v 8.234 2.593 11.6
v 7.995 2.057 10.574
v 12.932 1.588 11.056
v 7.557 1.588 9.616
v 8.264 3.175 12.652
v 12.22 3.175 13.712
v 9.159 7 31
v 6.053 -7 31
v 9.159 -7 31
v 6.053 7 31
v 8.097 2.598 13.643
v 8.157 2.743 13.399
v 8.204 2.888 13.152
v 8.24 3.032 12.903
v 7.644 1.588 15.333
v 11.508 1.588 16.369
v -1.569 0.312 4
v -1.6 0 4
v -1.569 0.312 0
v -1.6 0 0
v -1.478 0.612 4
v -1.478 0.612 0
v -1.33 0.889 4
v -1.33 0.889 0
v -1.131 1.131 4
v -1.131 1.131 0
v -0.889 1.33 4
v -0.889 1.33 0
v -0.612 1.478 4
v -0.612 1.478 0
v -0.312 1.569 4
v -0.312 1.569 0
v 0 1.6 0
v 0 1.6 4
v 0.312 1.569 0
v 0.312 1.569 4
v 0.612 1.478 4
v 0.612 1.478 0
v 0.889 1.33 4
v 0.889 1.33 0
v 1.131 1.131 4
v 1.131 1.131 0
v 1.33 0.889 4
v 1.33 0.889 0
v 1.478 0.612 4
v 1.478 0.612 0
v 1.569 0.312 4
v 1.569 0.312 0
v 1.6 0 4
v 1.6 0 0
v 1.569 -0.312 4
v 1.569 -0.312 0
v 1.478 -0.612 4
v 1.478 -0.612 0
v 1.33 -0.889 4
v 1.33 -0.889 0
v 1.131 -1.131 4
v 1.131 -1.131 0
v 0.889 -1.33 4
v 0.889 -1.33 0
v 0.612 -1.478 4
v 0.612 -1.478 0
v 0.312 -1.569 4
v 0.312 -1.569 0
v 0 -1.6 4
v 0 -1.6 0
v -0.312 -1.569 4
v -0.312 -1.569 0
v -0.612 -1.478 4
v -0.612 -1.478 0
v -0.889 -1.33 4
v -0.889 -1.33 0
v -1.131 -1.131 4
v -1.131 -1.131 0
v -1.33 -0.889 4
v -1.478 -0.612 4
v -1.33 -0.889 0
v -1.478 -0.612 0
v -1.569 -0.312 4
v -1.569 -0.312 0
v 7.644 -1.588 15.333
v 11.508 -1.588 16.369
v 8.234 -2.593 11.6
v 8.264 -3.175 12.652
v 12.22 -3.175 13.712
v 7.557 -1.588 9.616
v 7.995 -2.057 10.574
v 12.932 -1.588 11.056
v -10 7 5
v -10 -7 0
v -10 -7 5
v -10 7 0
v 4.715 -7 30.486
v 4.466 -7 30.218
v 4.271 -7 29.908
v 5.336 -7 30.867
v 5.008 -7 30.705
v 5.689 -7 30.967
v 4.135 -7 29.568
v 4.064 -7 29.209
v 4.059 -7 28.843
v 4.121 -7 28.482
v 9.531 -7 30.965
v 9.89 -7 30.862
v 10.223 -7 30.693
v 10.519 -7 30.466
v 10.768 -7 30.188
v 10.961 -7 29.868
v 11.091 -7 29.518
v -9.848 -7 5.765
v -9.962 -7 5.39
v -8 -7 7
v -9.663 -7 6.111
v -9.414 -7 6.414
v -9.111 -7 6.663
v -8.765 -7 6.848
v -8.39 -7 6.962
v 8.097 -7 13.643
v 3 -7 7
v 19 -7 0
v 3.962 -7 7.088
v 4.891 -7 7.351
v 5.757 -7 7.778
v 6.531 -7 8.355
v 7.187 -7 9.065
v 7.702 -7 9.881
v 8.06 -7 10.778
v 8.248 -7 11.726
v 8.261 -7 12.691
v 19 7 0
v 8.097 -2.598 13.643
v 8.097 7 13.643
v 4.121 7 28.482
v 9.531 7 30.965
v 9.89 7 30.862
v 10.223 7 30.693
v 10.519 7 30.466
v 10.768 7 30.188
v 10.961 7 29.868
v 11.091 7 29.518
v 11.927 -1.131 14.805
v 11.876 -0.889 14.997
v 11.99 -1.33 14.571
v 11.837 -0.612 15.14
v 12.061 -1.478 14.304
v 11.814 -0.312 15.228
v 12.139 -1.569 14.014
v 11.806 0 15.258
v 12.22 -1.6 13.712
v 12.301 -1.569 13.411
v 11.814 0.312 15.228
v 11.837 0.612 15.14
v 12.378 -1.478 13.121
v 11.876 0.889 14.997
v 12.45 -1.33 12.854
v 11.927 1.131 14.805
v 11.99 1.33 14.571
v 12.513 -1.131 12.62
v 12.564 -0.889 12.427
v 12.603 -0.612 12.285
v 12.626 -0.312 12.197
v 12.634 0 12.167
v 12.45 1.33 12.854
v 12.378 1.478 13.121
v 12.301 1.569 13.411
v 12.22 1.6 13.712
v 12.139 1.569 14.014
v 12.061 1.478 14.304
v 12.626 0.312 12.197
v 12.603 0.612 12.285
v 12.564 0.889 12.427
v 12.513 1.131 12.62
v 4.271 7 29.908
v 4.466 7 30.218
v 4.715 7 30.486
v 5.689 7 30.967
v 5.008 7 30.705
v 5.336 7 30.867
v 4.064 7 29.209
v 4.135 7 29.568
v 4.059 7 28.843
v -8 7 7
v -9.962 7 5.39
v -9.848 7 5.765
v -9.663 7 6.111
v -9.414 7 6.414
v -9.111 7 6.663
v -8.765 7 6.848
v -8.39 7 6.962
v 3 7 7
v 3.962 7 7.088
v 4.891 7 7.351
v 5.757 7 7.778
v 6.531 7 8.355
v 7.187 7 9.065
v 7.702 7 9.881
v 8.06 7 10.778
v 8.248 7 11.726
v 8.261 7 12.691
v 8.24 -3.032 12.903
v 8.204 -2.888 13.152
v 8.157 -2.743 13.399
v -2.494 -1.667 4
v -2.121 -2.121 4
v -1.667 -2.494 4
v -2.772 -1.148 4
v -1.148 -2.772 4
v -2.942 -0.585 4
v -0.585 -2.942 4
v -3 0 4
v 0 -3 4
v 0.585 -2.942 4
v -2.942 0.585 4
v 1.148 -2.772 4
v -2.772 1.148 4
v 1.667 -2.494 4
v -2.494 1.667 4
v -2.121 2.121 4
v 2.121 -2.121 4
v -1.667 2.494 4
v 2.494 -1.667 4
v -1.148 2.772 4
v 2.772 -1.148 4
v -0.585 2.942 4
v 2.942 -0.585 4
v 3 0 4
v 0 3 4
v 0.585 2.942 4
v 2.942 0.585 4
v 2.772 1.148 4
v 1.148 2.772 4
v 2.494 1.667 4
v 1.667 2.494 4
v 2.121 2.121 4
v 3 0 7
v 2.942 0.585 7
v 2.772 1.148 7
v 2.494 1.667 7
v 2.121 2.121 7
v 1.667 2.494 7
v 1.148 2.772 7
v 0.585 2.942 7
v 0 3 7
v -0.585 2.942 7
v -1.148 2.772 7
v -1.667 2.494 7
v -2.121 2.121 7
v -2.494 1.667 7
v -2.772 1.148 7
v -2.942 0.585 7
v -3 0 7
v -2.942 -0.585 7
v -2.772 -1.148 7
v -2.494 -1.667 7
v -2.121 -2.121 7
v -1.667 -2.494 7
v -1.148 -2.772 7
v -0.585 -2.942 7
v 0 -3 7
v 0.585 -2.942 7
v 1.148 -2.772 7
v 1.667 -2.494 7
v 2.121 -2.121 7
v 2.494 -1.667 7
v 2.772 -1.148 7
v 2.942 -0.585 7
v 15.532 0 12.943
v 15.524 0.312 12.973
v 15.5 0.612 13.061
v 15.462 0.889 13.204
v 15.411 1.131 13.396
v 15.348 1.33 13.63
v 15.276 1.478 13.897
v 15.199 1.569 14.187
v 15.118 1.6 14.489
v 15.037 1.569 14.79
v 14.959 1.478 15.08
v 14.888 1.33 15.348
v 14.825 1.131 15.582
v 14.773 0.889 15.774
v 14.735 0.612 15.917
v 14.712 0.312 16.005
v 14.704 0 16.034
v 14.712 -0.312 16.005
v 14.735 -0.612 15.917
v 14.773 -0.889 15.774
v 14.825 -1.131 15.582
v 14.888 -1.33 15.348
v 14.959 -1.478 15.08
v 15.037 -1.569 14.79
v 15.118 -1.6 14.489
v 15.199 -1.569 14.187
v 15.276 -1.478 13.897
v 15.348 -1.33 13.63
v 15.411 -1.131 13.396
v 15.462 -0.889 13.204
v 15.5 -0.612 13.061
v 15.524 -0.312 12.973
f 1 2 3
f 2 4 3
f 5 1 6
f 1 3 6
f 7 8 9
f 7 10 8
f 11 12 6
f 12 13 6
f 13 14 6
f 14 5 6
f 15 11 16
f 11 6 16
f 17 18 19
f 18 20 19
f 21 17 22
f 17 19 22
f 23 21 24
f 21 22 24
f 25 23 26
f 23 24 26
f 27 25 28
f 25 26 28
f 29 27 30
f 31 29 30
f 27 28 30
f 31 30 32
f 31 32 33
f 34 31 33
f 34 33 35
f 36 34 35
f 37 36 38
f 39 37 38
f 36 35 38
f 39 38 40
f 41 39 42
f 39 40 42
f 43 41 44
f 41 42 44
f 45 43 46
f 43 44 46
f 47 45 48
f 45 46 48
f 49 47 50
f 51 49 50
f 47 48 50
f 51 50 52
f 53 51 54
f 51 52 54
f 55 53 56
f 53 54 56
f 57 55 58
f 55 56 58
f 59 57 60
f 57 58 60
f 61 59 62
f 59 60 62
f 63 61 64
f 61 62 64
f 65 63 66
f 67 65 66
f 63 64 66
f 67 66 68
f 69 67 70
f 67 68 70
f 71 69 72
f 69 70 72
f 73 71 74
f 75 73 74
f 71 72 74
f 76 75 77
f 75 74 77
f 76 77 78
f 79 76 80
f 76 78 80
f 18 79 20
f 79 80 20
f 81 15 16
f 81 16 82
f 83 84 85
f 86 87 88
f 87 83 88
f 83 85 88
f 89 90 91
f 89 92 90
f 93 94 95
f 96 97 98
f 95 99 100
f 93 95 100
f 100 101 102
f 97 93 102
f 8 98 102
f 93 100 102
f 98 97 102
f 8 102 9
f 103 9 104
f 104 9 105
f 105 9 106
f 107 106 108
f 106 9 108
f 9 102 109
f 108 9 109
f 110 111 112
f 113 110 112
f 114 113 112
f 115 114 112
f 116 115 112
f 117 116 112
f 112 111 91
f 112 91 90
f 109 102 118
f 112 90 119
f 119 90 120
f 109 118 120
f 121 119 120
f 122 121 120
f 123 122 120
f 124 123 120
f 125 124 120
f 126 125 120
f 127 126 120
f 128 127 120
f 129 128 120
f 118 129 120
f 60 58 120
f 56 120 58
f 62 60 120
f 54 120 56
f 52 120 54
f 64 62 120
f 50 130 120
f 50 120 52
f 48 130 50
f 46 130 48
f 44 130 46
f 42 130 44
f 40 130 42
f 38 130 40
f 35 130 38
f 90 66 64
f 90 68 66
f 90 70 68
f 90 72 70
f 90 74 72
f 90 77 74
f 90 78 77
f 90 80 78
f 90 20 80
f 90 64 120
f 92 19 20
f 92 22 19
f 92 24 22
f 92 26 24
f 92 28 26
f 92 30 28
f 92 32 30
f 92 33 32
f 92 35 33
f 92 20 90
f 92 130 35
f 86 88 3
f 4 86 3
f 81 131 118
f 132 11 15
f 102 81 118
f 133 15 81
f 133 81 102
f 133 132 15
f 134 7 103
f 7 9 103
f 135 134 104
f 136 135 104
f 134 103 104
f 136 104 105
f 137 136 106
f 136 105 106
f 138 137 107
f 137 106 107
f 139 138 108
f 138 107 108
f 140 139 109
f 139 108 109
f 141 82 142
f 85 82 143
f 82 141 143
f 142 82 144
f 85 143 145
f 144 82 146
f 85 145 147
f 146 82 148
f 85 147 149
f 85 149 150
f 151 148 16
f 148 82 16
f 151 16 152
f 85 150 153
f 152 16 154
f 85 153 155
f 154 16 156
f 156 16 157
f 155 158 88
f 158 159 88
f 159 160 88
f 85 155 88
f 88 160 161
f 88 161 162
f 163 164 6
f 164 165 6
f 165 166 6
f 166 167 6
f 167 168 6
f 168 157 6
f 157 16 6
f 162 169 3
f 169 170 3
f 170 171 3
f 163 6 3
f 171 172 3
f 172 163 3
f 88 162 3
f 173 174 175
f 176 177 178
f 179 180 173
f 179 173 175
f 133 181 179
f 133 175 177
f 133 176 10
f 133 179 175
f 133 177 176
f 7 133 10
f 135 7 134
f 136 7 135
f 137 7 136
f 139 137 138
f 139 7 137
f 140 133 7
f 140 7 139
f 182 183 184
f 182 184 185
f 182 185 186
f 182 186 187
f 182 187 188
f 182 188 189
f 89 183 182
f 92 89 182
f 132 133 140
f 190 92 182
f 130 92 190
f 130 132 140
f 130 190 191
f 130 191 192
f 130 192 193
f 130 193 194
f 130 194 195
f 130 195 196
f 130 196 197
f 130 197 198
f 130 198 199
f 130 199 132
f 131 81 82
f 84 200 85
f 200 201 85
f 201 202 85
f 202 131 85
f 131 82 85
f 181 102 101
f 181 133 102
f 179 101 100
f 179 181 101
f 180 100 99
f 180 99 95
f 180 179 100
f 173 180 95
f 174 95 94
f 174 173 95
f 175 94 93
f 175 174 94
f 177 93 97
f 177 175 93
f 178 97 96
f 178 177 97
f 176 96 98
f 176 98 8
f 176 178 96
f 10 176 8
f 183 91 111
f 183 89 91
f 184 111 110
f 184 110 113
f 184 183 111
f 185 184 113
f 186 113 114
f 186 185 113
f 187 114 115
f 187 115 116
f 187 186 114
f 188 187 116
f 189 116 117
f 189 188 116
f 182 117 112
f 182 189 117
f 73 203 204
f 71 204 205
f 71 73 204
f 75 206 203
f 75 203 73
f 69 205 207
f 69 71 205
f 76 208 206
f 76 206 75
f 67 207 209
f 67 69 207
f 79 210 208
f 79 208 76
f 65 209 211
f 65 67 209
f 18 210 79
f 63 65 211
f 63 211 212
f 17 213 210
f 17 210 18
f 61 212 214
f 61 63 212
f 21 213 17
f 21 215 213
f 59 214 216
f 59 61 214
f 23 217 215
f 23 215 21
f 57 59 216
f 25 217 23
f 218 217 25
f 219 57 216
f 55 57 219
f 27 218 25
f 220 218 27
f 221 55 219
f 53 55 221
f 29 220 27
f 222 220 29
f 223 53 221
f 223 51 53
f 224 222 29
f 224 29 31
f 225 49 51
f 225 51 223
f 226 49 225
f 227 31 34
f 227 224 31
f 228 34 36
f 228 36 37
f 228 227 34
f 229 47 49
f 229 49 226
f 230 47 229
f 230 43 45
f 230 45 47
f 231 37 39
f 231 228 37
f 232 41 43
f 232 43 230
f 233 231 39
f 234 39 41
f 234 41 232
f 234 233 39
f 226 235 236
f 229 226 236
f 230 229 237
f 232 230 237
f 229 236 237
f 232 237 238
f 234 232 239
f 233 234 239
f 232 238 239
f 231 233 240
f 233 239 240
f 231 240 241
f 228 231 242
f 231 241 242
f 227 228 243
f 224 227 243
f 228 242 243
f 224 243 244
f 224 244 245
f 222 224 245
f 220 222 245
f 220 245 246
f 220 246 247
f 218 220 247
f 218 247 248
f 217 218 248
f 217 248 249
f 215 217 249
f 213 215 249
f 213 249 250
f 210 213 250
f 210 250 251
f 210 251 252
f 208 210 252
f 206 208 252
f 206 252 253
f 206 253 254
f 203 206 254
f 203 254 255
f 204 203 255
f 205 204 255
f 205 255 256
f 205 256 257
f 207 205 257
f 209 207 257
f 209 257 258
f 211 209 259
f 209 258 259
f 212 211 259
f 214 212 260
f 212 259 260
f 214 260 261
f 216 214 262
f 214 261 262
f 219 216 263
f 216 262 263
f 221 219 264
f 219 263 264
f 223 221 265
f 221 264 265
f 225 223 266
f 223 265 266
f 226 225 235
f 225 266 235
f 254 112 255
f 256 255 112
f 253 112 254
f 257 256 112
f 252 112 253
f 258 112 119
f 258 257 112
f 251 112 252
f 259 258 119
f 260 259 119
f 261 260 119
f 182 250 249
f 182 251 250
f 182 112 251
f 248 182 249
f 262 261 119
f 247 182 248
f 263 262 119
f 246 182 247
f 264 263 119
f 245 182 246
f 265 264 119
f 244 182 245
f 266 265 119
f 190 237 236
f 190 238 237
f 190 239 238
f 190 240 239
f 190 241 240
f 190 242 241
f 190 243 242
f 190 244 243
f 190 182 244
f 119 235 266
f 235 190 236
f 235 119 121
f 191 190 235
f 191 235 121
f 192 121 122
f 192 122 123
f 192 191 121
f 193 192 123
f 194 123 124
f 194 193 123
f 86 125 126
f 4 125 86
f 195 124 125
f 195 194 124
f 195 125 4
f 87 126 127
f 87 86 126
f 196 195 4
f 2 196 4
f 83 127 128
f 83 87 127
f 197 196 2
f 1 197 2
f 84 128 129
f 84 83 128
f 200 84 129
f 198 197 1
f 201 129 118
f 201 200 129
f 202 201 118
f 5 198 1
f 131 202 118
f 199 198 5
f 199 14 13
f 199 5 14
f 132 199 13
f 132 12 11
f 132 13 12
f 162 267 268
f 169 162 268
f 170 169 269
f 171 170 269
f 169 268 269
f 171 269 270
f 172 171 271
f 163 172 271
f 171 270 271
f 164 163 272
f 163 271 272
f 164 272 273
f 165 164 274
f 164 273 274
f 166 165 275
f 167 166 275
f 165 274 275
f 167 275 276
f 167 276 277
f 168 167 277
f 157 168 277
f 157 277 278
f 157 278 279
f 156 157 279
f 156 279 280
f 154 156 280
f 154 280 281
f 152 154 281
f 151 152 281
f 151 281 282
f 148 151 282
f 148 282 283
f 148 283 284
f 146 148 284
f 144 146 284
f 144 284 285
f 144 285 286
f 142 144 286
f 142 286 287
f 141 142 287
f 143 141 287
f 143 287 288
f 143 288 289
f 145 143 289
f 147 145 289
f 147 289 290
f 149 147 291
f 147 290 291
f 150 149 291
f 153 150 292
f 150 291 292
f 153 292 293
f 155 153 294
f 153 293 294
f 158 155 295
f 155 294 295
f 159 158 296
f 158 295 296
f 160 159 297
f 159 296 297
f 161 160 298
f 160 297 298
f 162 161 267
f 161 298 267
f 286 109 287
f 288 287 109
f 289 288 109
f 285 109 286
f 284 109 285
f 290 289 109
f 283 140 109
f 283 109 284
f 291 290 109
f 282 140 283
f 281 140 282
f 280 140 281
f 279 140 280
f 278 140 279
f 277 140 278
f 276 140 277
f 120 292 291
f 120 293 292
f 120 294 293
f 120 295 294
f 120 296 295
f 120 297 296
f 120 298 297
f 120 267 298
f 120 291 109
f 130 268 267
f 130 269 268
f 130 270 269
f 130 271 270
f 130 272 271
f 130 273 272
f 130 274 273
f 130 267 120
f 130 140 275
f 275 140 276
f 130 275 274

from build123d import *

# Parameters (mm, degrees)
BOSS_EXTRU_1_DEPTH                              = 7
CHAMBRAGE_POUR_VIS_T_TE_CYLINDRIQUE_D           = 3.2
CHAMBRAGE_POUR_VIS_T_TE_CYLINDRIQUE_CBORE_D     = 6
CHAMBRAGE_POUR_VIS_T_TE_CYLINDRIQUE_CBORE_DEPTH = 3
CONG_1_R                                        = 2
ESQUISSE5_R                                     = 1.6
ENL_V_MAT_EXTRU_1_DEPTH                         = 10
ENL_V_START                                     = -3
ENL_V_MAT_EXTRU_2_DEPTH                         = 7


with BuildPart() as part:
    # Esquisse1 → Boss.-Extru.1 (new, symmetric)
    with BuildSketch(Plane(origin=(0, 0, 0), x_dir=(1, 0, 0), z_dir=(0, 1, 0))):
        with BuildLine():
            Line((-10, 0), (-10, -7))
            Line((-10, -7), (3, -7))
            ThreePointArc((3, -7), (7.186709482, -9.064656631), (8.097414494, -13.643079905))
            Line((8.097414494, -13.643079905), (3.446641772, -31))
            Line((3.446641772, -31), (10.693575035, -31))
            Line((10.693575035, -31), (19, 0))
            Line((19, 0), (-10, 0))
        make_face()
    extrude(amount=BOSS_EXTRU_1_DEPTH, both=True)

    # Chambrage pour vis à tête cylindrique à 6 pans creux (ou vis CHC) M31 (through all)
    with Locations(Plane.XY.offset(7)):
        with Locations((0, 0)):
            CounterBoreHole(CHAMBRAGE_POUR_VIS_T_TE_CYLINDRIQUE_D / 2, CHAMBRAGE_POUR_VIS_T_TE_CYLINDRIQUE_CBORE_D / 2, CHAMBRAGE_POUR_VIS_T_TE_CYLINDRIQUE_CBORE_DEPTH)

    # Congé1
    cong_1_edges = [part.edges().sort_by_distance(p)[0] for p in [
        (10.693575035, 0, 31),
        (3.446641772, 0, 31),
        (-10, 0, 7),
    ]]
    fillet(cong_1_edges, radius=CONG_1_R)

    # Esquisse5 → Enlèv. mat.-Extru.1 (cut)
    with BuildSketch(Plane(origin=(17.727241336, 0, 4.75), x_dir=(0.25881904510252474, 0, -0.9659258262890673), z_dir=(0.9659258262890673, 0, 0.25881904510252474))):
        with Locations((-10.082438143, 0)):
            Circle(ESQUISSE5_R)
    extrude(amount=-ENL_V_MAT_EXTRU_1_DEPTH, mode=Mode.SUBTRACT)

    # Esquisse6 → Enlèv. mat.-Extru.2 (cut)
    with BuildSketch(Plane(origin=(17.727241336, 0, 4.75), x_dir=(0.25881904510252474, 0, -0.9659258262890673), z_dir=(0.9659258262890673, 0, 0.25881904510252474)).offset(ENL_V_START)):
        Polygon((-7.332438143, 1.58771324), (-10.082438143, 3.175426481), (-12.832438143, 1.58771324), (-12.832438143, -1.58771324), (-10.082438143, -3.175426481), (-7.332438143, -1.58771324), align=None)
    extrude(amount=-ENL_V_MAT_EXTRU_2_DEPTH, mode=Mode.SUBTRACT)


solid = part.part
